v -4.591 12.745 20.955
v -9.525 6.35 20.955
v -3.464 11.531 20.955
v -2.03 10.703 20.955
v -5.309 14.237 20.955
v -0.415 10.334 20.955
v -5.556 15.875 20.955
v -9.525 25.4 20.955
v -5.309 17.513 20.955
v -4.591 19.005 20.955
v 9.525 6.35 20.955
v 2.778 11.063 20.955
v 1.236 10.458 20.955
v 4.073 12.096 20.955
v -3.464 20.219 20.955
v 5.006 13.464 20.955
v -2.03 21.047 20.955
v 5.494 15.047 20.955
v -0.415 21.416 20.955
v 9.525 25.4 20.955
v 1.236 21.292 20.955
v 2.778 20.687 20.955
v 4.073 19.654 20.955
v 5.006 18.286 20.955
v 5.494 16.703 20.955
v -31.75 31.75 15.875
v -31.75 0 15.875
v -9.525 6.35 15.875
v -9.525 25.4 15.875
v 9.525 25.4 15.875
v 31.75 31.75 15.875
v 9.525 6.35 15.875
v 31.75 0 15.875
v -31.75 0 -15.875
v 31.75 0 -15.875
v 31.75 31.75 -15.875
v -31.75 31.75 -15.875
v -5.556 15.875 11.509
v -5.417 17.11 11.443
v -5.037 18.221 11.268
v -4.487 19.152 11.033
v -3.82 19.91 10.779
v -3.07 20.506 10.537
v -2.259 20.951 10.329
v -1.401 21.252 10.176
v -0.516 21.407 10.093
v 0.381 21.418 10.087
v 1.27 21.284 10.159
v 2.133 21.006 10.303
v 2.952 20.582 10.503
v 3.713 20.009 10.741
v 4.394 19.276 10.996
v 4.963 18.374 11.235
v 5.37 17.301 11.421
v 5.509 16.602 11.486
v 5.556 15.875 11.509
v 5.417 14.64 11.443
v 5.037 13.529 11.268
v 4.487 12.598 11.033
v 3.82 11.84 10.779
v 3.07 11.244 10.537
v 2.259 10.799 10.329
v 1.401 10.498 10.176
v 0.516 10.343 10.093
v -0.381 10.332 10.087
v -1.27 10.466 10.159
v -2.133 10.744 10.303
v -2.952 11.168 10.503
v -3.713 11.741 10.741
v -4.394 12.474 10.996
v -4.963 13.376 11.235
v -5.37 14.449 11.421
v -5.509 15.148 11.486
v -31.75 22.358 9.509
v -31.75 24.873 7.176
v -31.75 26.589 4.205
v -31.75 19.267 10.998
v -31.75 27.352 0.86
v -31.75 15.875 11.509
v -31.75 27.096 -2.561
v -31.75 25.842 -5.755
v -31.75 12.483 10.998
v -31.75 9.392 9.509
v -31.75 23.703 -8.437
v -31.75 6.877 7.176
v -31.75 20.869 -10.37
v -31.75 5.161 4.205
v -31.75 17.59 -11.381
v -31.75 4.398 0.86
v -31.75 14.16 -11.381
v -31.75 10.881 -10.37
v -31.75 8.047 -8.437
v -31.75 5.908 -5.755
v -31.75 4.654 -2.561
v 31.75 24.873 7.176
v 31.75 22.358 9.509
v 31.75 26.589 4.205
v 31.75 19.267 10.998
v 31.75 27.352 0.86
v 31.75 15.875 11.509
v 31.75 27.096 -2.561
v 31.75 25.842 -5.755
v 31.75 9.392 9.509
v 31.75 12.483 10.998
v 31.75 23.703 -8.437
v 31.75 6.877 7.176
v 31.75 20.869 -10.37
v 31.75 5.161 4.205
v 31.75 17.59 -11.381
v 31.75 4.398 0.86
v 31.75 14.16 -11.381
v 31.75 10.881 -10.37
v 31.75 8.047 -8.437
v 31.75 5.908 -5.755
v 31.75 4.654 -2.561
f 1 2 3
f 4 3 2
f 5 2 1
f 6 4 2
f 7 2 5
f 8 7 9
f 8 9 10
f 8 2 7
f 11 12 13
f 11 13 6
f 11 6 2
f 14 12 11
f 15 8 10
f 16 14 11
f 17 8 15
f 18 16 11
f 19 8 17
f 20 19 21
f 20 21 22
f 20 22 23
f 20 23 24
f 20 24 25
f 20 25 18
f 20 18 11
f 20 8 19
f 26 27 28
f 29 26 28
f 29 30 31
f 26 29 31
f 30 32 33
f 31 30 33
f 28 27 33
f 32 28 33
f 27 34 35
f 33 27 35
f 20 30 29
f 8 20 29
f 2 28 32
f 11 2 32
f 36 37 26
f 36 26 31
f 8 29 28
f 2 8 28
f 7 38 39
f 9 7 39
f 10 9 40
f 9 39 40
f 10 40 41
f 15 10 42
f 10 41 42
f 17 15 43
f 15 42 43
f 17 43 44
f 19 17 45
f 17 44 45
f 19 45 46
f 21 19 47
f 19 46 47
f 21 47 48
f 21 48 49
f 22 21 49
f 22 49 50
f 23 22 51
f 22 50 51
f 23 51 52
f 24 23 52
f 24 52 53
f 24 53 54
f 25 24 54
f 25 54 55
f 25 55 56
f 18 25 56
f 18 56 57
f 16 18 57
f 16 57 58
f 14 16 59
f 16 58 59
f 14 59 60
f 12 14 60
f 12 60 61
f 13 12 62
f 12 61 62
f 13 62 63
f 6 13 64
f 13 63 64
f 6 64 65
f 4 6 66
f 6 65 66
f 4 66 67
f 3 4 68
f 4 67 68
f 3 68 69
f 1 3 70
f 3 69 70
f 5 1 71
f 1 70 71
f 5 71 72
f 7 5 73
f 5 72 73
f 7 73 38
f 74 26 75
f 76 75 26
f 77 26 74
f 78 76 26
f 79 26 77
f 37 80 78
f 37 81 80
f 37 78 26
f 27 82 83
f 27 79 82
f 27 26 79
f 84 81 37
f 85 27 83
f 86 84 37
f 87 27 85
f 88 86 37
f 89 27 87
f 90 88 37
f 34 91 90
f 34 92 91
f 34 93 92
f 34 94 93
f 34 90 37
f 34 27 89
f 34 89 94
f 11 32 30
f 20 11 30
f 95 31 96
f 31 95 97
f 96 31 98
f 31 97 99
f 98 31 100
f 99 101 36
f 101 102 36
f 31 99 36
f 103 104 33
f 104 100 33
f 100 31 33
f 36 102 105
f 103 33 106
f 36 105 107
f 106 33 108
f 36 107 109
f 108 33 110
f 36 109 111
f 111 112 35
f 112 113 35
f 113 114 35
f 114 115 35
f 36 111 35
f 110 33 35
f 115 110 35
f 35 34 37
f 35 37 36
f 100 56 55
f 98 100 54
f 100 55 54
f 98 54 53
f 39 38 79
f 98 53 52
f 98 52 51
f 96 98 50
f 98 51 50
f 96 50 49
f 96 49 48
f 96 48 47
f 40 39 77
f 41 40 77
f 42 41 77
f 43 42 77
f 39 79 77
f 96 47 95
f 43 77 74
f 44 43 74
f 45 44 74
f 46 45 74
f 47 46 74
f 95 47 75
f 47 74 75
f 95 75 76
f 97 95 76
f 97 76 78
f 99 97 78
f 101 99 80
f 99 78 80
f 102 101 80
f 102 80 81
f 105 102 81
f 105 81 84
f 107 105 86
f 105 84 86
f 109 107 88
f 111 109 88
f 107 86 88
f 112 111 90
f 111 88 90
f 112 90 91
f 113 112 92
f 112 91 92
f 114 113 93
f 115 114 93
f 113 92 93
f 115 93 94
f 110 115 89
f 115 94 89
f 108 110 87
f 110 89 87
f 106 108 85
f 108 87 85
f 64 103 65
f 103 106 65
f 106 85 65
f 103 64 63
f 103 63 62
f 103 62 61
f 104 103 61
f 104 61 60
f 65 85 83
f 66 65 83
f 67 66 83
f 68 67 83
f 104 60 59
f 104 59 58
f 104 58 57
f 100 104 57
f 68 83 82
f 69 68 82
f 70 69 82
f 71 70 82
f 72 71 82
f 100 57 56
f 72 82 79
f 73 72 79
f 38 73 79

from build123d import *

# Parameters (mm, degrees)
SKETCH2_W                          = 63.5
SKETCH2_H                          = 31.75
BOSS_EXTRUDE1_DEPTH                = 31.75
F_29_32_0_90625_DIAMETER_HOLE1_D   = 23.01875
BOSS_EXTRUDE2_DEPTH                = 5.08
F_7_16_0_4375_DIAMETER_HOLE1_D     = 11.1125
F_7_16_0_4375_DIAMETER_HOLE1_DEPTH = 25.4
F_7_16_0_4375_DIAMETER_HOLE1_TIP   = 3.338531814


with BuildPart() as part:
    # Sketch2 → Boss-Extrude1 (new body)
    with BuildSketch(Plane(origin=(0, 0, 0), x_dir=(1, 0, 0), z_dir=(0, 1, 0))):
        Rectangle(SKETCH2_W, SKETCH2_H)
    extrude(amount=BOSS_EXTRUDE1_DEPTH)

    # 29/32 (0.90625) Diameter Hole1 (through all)
    with Locations(Plane(origin=(31.75, 0, 0), x_dir=(0, 0, -1), z_dir=(1, 0, 0))):
        with Locations((0, 15.875)):
            Hole(F_29_32_0_90625_DIAMETER_HOLE1_D / 2)

    # Sketch10 → Boss-Extrude2 (add)
    with BuildSketch(Plane.XY.offset(15.875)):
        Polygon((9.525, 11.1125), (-9.525, 20.6375), (-9.525, 6.35), (9.525, 6.35), align=None)
        Polygon((-9.525, 25.4), (-9.525, 20.6375), (9.525, 11.1125), (9.525, 25.4), align=None)
    extrude(amount=BOSS_EXTRUDE2_DEPTH)

    # 7/16 (0.4375) Diameter Hole1
    with Locations(Plane.XY.offset(20.955)):
        with Locations((0, 15.875)):
            Hole(F_7_16_0_4375_DIAMETER_HOLE1_D / 2, depth=F_7_16_0_4375_DIAMETER_HOLE1_DEPTH)
            with Locations((0, 0, -(F_7_16_0_4375_DIAMETER_HOLE1_DEPTH + F_7_16_0_4375_DIAMETER_HOLE1_TIP / 2))):  # 118° drill point
                Cone(0, F_7_16_0_4375_DIAMETER_HOLE1_D / 2, F_7_16_0_4375_DIAMETER_HOLE1_TIP, mode=Mode.SUBTRACT)


solid = part.part
